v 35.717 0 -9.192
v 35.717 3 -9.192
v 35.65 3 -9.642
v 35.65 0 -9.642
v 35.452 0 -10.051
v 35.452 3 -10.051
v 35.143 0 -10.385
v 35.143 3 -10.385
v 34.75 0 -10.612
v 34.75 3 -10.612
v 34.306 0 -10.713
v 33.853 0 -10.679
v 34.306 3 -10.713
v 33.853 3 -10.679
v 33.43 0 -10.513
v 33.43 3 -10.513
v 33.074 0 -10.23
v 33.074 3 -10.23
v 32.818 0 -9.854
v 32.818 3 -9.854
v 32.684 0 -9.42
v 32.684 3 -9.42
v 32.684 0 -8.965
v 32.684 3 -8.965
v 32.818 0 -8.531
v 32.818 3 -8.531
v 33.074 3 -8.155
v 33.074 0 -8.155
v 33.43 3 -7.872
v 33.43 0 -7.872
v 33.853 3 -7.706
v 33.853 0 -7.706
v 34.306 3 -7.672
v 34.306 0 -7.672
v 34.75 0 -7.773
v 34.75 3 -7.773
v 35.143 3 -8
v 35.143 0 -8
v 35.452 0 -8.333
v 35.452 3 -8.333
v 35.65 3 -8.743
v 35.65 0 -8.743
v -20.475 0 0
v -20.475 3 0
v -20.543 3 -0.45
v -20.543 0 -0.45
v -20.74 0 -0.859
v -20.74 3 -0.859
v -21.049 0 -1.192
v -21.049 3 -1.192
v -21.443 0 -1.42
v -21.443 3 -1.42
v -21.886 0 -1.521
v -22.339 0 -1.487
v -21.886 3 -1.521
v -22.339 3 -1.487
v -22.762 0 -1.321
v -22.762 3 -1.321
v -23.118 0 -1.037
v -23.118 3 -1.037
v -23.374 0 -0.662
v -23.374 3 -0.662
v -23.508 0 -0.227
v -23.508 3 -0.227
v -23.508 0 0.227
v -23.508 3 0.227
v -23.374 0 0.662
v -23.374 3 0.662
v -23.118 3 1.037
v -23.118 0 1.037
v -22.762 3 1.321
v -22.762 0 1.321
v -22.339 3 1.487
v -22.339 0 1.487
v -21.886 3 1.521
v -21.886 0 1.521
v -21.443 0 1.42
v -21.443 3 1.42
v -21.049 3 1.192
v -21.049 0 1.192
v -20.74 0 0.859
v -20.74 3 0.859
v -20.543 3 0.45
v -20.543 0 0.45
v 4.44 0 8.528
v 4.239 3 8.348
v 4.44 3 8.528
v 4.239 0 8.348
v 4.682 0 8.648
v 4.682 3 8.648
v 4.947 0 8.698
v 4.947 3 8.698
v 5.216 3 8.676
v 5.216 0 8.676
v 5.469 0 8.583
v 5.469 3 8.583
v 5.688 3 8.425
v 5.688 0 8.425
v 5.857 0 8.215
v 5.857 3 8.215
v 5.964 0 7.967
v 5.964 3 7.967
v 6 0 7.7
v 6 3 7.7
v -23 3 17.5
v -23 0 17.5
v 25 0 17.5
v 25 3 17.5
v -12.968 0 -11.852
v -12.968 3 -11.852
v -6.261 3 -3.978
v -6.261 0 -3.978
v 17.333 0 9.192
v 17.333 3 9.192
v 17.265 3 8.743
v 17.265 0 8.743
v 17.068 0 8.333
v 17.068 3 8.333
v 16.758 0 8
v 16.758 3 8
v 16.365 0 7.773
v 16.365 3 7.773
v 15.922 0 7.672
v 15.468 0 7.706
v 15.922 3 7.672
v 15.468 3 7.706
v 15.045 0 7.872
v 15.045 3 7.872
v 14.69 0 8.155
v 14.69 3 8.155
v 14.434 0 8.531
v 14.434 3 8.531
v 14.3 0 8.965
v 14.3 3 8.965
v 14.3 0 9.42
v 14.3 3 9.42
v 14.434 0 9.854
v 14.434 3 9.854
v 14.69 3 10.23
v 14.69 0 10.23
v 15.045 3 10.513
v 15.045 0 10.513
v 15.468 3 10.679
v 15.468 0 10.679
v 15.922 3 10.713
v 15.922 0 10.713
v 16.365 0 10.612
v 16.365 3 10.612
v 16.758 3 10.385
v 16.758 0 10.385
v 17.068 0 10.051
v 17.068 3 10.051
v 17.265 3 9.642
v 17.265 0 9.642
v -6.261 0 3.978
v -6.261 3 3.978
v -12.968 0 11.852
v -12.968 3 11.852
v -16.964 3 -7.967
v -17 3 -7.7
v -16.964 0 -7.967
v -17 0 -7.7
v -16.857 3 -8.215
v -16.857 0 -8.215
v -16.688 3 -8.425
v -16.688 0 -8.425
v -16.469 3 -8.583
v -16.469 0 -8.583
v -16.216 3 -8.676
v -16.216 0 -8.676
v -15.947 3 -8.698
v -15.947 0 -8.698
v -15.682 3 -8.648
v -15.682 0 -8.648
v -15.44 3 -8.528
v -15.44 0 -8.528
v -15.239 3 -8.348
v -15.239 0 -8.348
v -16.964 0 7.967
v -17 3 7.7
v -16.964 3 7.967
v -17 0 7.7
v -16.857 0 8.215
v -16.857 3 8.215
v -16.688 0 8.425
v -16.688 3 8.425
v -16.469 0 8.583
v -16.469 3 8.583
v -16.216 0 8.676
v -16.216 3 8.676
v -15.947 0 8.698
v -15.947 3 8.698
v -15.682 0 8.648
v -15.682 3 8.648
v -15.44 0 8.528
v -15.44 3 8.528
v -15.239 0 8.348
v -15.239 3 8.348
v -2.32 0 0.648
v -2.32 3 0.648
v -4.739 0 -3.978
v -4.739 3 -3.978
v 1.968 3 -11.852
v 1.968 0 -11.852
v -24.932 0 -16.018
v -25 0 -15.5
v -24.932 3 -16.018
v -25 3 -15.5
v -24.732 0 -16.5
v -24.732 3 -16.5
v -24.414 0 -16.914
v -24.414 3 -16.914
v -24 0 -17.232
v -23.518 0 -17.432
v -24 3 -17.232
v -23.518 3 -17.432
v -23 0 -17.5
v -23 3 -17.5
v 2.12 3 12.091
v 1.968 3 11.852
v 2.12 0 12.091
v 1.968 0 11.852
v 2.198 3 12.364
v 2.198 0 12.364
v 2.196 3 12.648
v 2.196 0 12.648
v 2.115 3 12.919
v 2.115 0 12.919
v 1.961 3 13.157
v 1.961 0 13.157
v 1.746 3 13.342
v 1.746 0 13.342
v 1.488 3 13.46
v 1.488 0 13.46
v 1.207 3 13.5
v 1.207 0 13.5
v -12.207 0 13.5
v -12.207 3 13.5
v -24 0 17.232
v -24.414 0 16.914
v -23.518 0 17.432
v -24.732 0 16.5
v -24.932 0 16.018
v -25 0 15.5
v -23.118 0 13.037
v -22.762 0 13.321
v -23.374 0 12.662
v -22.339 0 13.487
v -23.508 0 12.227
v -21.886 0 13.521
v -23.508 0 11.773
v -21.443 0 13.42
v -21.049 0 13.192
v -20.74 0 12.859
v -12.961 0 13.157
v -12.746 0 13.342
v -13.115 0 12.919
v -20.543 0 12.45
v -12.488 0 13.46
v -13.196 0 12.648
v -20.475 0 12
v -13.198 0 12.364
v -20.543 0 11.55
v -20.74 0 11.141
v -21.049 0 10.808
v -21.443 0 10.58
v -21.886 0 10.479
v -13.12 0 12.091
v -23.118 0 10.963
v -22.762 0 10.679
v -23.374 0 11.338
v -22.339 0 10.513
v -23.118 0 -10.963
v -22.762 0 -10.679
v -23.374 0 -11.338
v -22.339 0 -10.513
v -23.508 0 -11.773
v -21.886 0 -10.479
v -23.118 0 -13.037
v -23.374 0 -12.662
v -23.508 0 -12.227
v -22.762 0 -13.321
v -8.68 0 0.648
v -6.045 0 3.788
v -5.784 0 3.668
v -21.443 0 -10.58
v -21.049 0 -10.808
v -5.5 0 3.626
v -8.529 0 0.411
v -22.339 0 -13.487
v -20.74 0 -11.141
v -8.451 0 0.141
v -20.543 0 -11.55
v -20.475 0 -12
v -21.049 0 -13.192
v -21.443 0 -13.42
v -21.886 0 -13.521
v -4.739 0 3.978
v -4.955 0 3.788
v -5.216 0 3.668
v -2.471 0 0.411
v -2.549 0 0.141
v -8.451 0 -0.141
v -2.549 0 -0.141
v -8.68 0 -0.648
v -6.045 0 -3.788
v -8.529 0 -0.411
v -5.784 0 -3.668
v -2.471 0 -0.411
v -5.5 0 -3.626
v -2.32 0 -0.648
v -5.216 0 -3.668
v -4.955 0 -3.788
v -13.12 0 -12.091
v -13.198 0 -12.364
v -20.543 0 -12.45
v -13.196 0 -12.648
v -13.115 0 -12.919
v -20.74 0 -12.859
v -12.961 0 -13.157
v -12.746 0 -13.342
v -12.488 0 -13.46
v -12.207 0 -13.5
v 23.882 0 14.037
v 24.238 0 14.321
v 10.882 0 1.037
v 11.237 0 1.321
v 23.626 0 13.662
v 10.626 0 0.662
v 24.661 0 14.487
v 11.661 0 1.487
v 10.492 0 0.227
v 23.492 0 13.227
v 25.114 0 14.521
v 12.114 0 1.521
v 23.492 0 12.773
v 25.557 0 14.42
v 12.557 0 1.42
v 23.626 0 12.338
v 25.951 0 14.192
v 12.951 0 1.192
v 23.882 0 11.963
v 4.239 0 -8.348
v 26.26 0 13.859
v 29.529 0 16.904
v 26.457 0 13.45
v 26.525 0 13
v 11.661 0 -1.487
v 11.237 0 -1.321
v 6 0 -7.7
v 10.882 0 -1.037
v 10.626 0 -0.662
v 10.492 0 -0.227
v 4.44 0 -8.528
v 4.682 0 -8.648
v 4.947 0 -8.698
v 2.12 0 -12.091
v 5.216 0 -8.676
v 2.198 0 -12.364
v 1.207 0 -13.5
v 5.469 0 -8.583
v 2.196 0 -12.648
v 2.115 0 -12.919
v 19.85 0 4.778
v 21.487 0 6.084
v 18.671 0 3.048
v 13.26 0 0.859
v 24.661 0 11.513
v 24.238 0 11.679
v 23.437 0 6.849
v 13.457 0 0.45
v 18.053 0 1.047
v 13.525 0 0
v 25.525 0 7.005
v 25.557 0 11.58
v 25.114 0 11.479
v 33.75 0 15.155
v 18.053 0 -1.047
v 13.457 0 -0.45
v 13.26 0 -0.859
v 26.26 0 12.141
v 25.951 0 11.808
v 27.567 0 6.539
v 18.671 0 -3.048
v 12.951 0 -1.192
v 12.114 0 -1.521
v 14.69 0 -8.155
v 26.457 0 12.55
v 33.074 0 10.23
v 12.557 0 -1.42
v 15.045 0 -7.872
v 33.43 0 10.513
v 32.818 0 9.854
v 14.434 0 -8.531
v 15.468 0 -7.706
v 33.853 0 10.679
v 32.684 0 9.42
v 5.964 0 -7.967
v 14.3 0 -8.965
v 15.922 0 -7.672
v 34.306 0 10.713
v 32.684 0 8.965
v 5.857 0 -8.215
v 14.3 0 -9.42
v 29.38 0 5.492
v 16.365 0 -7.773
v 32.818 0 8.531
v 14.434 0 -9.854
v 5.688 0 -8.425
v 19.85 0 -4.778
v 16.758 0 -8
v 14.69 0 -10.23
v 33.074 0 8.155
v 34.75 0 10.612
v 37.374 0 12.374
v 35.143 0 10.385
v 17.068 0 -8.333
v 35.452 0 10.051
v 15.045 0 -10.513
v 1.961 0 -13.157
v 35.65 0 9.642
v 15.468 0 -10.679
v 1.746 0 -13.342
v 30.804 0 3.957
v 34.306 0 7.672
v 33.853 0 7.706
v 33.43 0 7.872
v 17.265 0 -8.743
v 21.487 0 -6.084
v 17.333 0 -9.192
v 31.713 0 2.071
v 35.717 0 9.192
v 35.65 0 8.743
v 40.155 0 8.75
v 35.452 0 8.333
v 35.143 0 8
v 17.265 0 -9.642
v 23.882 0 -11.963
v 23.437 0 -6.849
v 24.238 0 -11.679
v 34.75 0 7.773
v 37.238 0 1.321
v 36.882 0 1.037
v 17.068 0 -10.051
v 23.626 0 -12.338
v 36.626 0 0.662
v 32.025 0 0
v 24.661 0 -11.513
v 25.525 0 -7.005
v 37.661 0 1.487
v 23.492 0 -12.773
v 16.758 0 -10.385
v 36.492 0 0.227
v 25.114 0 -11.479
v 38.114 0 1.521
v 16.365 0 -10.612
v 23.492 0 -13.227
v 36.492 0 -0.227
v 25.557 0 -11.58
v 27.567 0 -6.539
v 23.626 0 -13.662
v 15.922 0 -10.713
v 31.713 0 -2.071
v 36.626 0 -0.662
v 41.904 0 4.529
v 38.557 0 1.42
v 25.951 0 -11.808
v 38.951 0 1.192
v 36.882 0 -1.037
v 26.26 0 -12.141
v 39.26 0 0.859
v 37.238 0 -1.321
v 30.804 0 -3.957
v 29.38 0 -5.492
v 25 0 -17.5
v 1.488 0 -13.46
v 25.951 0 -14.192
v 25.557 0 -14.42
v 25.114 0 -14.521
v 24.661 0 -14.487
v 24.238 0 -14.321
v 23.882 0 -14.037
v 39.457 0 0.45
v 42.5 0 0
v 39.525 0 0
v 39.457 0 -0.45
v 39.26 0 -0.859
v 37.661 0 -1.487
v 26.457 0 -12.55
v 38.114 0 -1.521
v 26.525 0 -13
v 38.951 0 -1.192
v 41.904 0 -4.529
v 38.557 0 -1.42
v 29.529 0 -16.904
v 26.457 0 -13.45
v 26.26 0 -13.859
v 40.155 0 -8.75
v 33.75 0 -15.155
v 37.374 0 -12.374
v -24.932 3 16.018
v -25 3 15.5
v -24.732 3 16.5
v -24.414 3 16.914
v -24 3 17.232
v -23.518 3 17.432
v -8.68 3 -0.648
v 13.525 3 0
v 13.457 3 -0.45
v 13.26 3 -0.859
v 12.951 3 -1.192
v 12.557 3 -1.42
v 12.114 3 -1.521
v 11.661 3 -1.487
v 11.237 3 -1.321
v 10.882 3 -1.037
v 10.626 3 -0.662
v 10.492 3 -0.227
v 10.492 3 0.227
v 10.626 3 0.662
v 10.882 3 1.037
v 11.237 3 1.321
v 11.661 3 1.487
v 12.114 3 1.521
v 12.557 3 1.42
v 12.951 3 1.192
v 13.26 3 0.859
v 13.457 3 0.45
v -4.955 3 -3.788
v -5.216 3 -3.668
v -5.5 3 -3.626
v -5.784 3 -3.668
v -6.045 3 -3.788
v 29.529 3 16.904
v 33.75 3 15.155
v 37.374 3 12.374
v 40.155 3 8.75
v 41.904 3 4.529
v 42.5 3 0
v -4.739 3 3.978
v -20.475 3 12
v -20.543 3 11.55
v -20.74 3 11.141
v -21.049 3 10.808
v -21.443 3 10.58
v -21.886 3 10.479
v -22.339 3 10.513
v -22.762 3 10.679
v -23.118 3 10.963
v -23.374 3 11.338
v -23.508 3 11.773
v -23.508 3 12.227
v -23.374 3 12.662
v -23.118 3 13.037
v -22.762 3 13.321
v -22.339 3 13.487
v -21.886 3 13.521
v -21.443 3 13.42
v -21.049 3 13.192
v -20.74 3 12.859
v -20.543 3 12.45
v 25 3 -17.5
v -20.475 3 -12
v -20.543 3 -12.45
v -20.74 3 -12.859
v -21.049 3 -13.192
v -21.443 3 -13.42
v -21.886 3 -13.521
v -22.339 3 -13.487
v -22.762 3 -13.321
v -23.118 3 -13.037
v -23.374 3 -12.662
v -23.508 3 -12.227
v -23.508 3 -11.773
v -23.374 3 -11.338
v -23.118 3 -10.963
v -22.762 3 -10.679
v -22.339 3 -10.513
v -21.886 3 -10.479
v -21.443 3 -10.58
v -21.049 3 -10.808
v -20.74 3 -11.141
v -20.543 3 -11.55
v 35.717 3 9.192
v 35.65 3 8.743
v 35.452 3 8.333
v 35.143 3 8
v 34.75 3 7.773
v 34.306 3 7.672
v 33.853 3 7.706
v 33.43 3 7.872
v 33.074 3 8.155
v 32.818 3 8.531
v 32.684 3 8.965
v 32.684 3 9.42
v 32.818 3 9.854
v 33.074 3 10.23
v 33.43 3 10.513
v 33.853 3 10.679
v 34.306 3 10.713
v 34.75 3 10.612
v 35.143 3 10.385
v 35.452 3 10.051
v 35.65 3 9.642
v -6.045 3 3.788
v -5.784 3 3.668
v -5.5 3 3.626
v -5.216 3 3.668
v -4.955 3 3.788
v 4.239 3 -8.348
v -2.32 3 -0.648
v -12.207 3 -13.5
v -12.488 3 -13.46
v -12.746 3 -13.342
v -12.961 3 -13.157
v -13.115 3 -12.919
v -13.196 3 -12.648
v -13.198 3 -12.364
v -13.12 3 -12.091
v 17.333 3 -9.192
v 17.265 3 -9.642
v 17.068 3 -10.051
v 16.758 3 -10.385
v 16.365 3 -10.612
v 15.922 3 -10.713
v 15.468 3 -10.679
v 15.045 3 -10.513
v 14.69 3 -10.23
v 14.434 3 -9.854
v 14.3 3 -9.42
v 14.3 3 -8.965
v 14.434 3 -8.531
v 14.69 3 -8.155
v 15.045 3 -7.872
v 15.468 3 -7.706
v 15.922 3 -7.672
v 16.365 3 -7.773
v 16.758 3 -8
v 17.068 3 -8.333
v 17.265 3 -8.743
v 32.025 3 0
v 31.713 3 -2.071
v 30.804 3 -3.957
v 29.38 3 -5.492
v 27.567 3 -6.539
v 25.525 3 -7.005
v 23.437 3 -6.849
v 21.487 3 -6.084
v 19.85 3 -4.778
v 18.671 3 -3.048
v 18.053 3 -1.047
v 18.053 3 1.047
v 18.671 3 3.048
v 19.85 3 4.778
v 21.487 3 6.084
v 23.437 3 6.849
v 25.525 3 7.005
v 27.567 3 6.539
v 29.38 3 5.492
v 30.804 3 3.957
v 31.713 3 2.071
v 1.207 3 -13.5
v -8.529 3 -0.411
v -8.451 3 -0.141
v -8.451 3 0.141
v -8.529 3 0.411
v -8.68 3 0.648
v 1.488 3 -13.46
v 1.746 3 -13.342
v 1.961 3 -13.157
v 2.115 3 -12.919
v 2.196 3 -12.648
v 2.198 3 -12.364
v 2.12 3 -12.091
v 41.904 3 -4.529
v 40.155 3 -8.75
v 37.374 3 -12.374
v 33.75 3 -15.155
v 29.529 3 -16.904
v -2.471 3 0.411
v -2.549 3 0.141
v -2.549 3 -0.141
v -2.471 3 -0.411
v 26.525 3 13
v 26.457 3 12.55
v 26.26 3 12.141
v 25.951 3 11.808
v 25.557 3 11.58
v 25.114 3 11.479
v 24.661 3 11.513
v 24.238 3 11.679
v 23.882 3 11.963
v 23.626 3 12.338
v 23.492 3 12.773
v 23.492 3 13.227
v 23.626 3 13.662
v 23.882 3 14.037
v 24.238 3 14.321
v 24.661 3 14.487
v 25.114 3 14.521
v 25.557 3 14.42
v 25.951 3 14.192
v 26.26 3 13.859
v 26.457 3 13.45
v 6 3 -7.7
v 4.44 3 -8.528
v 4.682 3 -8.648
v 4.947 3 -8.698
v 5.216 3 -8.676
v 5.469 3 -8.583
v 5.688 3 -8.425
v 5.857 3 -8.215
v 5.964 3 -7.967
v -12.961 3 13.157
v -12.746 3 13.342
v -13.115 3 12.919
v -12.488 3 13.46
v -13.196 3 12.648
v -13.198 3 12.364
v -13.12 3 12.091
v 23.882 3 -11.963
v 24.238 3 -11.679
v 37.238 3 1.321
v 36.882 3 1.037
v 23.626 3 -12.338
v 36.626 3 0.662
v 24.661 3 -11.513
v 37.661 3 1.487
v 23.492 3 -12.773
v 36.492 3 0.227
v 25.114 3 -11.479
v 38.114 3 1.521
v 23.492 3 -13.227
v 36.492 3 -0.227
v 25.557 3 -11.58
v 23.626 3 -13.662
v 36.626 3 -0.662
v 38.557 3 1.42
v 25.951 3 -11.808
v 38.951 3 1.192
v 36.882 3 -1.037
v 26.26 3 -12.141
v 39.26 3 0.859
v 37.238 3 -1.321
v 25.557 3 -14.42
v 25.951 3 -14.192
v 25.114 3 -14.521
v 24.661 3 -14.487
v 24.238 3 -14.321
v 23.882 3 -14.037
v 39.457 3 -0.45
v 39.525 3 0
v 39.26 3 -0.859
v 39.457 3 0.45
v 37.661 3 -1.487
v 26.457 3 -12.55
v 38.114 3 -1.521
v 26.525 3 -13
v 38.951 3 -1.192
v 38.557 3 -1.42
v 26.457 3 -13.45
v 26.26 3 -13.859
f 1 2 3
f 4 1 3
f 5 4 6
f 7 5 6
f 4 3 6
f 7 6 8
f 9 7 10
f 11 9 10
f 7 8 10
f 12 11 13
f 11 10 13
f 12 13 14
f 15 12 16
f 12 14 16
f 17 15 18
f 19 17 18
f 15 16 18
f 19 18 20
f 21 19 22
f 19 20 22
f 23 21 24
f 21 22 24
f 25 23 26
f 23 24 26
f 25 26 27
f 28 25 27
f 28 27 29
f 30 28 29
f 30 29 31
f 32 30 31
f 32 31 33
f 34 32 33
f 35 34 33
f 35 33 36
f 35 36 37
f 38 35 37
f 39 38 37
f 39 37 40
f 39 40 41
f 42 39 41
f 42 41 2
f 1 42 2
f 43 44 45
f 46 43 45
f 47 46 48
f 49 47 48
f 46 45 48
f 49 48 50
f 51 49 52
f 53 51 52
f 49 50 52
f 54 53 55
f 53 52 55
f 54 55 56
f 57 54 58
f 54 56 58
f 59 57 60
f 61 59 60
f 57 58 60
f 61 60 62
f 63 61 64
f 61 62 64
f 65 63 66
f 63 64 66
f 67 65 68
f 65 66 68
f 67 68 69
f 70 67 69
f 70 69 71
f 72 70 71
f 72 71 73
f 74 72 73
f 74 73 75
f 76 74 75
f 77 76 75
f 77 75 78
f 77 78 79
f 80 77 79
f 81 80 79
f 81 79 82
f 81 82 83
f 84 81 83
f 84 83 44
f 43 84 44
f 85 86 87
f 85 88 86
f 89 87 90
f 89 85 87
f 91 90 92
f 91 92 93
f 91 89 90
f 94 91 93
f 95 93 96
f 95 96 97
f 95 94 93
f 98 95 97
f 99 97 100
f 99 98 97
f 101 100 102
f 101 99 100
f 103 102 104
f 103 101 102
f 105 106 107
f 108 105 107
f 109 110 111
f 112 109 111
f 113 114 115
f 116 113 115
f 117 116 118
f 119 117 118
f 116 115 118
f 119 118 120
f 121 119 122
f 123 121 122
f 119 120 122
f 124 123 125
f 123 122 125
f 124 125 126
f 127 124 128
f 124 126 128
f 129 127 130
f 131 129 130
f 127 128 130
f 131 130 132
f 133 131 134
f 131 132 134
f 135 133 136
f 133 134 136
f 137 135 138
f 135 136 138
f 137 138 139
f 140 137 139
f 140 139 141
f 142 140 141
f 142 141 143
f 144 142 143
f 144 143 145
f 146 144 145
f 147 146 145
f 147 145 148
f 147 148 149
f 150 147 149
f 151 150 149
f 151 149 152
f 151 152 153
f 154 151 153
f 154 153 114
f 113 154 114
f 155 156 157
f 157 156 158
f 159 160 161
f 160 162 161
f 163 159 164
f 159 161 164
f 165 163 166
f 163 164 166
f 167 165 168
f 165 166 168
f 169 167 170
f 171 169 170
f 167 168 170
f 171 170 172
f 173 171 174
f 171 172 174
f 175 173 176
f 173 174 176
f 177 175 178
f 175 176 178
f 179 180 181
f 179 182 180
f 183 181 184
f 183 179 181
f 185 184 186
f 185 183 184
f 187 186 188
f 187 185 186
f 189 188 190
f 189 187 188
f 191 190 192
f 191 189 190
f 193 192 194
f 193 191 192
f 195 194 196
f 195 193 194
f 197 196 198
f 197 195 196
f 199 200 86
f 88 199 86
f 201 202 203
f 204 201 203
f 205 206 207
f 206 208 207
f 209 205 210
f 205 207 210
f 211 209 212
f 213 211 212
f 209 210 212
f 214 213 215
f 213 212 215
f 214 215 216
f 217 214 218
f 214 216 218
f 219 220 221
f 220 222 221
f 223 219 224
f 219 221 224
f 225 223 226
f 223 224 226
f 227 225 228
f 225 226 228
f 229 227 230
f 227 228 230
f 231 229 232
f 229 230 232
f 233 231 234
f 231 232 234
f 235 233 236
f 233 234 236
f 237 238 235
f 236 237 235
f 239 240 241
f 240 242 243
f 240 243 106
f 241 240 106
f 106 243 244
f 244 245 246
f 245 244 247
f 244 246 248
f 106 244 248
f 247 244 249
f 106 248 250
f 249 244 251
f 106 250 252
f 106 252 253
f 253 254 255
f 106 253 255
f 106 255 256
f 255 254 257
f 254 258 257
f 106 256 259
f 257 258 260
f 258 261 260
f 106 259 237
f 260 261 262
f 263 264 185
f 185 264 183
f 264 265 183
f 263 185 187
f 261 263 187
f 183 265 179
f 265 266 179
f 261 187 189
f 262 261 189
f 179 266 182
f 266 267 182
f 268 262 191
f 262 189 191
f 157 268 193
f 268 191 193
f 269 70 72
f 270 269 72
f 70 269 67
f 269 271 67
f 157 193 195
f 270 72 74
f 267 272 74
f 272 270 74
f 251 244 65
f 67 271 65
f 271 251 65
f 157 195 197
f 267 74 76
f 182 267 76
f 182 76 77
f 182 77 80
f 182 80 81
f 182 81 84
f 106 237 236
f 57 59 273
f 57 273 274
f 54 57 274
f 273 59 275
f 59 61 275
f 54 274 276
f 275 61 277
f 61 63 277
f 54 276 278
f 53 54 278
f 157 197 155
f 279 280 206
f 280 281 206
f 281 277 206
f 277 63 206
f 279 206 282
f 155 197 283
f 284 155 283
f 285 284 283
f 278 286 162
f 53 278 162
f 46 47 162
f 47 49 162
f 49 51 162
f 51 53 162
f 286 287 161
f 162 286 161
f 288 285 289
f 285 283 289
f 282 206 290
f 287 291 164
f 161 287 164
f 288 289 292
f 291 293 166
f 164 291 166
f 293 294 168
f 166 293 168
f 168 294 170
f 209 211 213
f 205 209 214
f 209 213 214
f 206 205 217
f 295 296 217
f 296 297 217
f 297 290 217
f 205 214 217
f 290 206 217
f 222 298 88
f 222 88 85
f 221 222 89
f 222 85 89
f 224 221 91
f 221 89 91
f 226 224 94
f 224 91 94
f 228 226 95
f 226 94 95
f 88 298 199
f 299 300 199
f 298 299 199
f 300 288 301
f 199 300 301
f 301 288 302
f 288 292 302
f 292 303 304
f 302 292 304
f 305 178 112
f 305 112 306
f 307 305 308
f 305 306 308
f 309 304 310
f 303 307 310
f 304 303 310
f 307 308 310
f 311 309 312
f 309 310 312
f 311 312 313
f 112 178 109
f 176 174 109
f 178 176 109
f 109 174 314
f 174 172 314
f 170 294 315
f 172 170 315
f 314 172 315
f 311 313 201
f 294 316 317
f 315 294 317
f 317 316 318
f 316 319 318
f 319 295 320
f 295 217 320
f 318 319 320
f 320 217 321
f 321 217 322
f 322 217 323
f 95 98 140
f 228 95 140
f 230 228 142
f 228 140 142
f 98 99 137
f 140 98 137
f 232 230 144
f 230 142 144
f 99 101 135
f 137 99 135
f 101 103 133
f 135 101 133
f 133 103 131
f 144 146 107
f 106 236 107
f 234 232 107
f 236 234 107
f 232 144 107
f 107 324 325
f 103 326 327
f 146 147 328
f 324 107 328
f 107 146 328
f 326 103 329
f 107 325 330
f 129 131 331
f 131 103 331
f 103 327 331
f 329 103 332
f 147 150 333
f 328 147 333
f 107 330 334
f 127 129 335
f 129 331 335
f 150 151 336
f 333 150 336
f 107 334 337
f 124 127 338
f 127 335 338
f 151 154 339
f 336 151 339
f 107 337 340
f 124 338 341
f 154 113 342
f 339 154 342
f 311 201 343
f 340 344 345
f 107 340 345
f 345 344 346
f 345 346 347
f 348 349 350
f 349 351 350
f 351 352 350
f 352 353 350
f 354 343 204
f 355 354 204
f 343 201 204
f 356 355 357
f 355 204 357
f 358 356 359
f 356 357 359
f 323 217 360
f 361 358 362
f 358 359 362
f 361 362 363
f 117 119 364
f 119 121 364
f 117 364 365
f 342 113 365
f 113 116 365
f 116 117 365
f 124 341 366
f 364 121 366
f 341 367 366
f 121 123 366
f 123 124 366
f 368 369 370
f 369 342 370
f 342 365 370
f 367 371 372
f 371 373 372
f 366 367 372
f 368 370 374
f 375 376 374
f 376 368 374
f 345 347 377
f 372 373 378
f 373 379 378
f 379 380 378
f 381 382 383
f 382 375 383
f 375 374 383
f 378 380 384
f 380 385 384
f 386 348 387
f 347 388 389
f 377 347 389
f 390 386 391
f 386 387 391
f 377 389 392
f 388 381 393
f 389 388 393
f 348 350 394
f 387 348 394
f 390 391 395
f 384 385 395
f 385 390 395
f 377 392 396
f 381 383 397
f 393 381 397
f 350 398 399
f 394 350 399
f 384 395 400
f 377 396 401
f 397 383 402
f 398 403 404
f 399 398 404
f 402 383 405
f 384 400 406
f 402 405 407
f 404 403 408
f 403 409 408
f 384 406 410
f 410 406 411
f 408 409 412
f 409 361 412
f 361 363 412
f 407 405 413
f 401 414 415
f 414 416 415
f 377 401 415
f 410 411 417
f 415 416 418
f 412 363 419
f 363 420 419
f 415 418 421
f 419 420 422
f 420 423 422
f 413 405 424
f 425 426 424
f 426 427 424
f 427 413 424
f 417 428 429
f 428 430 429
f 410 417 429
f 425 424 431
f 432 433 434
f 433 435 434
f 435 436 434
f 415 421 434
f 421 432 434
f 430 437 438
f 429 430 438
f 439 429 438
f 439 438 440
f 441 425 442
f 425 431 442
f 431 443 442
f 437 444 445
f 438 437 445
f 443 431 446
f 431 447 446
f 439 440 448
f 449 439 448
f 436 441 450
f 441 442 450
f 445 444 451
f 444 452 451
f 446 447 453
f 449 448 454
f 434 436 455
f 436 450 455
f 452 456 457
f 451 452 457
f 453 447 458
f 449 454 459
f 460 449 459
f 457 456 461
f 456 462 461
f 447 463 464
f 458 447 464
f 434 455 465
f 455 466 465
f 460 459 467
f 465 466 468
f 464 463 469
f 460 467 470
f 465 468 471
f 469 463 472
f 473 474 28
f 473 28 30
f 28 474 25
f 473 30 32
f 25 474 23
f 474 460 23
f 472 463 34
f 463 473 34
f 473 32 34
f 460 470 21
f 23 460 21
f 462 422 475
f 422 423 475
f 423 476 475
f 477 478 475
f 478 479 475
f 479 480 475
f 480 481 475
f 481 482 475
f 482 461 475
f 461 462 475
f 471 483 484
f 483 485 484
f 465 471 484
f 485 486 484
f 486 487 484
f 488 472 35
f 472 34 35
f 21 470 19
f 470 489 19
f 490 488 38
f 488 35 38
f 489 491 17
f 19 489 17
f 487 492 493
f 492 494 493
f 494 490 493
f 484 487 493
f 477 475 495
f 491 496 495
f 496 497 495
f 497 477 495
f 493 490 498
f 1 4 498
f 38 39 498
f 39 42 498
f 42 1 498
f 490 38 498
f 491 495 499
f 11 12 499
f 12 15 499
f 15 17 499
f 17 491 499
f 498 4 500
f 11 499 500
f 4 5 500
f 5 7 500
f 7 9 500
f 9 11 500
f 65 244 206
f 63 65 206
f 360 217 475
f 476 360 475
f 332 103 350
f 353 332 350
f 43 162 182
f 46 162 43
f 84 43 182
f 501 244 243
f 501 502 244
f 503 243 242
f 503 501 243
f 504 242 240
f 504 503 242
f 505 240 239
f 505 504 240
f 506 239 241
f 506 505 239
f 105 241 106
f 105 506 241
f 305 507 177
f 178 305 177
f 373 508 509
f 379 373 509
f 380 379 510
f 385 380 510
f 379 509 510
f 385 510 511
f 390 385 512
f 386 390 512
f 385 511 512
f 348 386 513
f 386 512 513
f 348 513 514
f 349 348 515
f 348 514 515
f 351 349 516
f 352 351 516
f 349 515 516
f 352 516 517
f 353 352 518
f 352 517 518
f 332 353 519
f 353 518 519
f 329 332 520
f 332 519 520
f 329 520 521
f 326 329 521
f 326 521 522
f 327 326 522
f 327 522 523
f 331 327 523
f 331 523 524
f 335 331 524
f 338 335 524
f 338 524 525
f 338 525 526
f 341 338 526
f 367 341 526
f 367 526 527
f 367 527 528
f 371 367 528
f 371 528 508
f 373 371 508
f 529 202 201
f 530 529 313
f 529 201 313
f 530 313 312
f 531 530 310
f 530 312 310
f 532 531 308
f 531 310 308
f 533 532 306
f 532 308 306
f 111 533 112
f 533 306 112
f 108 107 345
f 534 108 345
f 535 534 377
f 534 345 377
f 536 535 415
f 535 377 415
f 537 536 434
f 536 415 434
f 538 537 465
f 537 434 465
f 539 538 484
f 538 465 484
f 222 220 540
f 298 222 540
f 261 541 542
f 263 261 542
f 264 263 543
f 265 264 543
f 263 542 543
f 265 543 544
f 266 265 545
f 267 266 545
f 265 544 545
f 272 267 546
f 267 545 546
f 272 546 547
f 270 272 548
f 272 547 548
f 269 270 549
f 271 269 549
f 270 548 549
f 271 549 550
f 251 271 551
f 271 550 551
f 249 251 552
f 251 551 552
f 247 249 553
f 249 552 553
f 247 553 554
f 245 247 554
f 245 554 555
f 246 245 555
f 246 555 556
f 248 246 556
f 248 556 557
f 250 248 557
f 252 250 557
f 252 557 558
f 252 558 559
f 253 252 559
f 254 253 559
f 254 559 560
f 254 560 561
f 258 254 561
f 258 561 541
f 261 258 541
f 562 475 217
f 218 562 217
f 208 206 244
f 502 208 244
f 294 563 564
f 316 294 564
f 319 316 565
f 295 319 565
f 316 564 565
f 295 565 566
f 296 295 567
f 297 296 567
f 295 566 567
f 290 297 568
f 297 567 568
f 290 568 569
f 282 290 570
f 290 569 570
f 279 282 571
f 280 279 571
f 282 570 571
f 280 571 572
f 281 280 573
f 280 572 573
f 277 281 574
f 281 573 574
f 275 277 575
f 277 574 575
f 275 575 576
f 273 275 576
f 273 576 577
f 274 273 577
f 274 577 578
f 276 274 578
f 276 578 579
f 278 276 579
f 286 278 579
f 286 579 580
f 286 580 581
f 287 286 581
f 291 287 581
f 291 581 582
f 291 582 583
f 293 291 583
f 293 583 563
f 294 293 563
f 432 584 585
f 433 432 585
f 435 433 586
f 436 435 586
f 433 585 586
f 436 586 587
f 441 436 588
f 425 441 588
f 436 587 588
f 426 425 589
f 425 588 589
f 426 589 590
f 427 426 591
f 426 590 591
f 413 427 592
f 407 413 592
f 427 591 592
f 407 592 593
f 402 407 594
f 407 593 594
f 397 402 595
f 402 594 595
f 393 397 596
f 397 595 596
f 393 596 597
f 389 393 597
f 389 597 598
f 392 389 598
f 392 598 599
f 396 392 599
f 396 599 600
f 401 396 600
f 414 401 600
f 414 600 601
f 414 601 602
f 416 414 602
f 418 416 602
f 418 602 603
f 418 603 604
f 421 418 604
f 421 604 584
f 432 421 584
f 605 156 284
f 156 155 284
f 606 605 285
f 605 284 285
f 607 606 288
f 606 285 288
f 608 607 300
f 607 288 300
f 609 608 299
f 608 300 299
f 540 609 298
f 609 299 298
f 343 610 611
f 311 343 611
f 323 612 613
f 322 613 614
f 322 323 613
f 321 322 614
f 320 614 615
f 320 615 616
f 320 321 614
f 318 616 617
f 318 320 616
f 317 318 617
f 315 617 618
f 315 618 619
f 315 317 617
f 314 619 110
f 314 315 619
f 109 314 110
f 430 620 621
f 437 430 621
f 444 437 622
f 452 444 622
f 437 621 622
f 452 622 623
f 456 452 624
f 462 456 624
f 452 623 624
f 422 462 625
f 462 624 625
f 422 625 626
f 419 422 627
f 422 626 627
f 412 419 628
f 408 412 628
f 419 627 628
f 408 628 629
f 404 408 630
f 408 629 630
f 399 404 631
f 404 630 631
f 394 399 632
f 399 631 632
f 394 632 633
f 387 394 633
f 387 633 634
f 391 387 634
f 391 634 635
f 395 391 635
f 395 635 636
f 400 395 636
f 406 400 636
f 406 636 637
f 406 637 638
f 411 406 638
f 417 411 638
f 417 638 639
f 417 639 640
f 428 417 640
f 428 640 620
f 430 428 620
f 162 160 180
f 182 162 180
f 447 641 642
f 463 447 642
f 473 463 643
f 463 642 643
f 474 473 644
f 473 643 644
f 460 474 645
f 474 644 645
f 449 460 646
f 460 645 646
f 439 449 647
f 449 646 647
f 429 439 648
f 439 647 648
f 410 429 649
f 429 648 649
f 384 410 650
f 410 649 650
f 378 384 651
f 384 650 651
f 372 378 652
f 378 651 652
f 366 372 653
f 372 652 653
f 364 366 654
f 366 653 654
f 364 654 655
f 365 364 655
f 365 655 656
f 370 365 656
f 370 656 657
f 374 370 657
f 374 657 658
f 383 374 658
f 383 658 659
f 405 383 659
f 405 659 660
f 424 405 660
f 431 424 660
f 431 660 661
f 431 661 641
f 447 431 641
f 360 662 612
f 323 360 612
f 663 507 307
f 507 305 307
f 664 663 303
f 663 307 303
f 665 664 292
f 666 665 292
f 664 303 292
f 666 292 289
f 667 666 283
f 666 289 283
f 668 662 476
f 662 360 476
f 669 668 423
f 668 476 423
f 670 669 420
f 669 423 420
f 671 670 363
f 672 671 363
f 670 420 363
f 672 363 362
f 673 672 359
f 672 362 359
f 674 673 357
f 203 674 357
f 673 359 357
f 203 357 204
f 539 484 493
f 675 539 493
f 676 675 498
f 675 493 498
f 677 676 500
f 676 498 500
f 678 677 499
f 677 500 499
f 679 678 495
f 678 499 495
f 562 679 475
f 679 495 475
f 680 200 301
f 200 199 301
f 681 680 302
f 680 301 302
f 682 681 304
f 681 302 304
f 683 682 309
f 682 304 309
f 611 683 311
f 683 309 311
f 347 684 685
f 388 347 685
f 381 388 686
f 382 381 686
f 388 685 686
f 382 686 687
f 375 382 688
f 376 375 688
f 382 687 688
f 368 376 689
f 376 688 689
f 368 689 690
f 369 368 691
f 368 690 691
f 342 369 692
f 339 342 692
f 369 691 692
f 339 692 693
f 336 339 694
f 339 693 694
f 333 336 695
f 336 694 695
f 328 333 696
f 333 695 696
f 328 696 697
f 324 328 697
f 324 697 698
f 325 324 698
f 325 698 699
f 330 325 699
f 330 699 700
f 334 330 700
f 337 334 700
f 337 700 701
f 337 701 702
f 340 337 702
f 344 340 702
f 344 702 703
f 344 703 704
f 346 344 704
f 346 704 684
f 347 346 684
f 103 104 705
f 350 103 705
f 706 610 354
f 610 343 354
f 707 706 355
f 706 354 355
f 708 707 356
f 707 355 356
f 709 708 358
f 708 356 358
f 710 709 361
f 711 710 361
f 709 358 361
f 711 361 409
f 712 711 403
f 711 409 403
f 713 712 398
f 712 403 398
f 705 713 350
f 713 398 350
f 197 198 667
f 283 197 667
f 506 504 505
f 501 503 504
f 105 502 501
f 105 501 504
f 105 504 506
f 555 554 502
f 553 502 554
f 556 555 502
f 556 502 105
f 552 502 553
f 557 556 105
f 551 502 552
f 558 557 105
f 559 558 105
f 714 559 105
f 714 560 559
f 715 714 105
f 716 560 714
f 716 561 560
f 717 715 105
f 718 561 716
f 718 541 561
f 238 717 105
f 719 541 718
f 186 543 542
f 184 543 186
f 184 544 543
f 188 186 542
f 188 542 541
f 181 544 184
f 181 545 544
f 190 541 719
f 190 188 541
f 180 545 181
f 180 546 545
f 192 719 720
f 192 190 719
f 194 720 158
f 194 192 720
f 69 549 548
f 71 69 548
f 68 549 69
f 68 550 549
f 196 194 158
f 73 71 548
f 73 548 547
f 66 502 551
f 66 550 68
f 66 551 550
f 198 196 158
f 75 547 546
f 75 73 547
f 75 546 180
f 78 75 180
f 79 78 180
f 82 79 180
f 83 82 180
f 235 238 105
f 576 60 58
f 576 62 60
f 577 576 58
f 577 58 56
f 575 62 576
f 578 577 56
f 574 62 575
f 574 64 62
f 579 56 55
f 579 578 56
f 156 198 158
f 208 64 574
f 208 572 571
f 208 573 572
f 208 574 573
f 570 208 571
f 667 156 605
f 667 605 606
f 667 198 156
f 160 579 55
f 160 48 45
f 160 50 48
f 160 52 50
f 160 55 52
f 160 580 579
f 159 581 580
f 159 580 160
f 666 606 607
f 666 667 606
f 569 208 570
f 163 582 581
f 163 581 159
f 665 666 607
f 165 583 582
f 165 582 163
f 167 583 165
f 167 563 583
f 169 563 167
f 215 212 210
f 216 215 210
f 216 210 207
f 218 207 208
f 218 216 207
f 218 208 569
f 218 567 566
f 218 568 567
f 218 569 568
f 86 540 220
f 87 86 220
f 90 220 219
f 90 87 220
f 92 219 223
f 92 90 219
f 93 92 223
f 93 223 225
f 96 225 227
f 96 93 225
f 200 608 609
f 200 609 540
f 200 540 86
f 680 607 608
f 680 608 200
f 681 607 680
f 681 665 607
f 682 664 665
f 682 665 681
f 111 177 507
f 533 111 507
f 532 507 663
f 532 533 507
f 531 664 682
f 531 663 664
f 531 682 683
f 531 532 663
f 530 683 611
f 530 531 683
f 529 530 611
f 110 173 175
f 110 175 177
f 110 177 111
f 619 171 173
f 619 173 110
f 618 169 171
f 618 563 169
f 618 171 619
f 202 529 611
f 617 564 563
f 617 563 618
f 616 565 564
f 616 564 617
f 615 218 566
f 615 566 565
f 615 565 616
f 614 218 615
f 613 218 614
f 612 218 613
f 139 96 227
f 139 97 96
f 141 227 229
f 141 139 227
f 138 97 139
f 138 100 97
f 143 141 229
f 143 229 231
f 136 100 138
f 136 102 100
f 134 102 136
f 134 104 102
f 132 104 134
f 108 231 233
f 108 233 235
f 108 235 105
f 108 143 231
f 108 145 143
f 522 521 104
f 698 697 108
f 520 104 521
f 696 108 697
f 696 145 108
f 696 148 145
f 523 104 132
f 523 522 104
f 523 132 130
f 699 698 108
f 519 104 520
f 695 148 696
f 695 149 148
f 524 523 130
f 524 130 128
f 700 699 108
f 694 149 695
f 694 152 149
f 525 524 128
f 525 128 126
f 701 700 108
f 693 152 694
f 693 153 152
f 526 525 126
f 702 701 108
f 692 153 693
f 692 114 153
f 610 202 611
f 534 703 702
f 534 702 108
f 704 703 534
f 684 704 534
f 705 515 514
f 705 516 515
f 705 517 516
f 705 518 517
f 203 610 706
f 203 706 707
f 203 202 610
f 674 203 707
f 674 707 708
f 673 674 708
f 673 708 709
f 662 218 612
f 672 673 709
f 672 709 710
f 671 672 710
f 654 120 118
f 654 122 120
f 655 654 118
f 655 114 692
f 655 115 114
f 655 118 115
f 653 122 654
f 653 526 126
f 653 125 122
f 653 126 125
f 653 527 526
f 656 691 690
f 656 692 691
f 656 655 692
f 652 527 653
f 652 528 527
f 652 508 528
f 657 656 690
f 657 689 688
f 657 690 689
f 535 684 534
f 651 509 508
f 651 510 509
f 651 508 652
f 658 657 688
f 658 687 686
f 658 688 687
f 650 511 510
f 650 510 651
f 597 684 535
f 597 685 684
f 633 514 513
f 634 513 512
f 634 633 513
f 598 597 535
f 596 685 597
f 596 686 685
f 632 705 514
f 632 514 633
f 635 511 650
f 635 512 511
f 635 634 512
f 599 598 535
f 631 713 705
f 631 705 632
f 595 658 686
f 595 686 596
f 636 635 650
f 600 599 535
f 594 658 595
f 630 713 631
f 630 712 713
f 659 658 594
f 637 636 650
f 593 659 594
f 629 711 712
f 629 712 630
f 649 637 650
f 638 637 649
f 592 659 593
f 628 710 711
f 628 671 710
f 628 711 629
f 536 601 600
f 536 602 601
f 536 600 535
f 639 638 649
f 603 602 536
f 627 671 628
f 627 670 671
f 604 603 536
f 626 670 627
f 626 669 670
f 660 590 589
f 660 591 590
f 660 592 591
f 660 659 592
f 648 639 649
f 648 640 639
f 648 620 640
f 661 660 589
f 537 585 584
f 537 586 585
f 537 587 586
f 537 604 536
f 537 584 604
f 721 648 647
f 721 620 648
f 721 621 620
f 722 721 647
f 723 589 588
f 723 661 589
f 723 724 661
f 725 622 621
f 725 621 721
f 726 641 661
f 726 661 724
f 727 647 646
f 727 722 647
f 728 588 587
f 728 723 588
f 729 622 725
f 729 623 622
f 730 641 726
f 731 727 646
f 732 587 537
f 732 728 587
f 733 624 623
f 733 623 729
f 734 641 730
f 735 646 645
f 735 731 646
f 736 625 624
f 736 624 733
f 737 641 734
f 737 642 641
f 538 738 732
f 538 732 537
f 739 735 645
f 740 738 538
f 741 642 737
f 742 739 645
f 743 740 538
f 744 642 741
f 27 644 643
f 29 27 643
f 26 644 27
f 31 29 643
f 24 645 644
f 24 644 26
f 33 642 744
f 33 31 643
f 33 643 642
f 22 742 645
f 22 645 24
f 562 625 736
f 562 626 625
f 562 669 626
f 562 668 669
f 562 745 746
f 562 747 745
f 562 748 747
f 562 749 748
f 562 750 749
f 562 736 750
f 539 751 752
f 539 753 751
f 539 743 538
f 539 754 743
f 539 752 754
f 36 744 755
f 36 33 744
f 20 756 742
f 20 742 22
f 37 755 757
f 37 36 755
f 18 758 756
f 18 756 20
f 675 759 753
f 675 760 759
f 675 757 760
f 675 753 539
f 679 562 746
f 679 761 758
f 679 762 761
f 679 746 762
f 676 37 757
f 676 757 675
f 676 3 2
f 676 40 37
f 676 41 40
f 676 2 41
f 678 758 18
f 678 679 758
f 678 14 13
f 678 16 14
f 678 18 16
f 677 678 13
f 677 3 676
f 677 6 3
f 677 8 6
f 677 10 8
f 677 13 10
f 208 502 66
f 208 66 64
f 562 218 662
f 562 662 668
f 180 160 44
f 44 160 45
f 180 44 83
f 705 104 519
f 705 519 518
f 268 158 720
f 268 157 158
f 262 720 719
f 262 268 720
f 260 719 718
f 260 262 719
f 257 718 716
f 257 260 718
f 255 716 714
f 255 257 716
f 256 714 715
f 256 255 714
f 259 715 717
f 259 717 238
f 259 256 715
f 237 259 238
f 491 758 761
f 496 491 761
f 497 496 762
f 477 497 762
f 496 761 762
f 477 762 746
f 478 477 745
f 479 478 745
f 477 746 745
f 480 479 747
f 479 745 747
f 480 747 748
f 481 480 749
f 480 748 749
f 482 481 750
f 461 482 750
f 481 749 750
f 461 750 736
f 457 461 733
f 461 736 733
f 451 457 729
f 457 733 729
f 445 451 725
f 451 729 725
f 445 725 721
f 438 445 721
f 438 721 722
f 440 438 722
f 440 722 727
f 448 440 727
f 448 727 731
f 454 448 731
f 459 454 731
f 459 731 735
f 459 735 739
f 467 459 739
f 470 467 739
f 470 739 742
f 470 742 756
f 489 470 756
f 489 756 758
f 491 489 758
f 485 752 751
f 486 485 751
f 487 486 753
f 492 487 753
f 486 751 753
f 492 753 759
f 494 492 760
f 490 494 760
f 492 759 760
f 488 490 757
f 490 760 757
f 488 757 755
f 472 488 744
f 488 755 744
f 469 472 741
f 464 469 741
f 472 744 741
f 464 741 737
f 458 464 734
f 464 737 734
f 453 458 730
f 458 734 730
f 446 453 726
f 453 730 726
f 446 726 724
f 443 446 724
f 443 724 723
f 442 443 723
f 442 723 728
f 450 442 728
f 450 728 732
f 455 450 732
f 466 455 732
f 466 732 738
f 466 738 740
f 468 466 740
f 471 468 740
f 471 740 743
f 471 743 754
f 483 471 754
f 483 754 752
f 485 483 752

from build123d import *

# Parameters (mm, degrees)
EXTRUDE_1_DEPTH     = 3
SKETCH_2_R          = 7.025
CUT_EXTRUDE_1_DEPTH = 4
SKETCH_4_R          = 1.525
CUT_EXTRUDE_3_DEPTH = 4
FILLET_2_R          = 2
CUT_EXTRUDE_6_DEPTH = 4
SKETCH_10_R         = 1.525
CUT_EXTRUDE_8_DEPTH = 4
FILLET_7_R          = 1


with BuildPart() as part:
    # 草图1 → 凸台-拉伸1 (new body)
    with BuildSketch(Plane(origin=(0, 0, 0), x_dir=(1, 0, 0), z_dir=(0, 1, 0))):
        with BuildLine():
            Line((-25, 17.5), (-25, -17.5))
            Line((-25, -17.5), (25, -17.5))
            ThreePointArc((25, -17.5), (7.5, 0), (25, 17.5))
            Line((25, 17.5), (-25, 17.5))
        make_face()
        with BuildLine():
            ThreePointArc((25, 17.5), (7.5, 0), (25, -17.5))
            Line((25, -17.5), (25, 17.5))
        make_face()
        with BuildLine():
            Line((25, 17.5), (25, -17.5))
            ThreePointArc((25, -17.5), (37.374368671, -12.374368671), (42.5, 0))
            ThreePointArc((42.5, 0), (37.374368671, 12.374368671), (25, 17.5))
        make_face()
    extrude(amount=EXTRUDE_1_DEPTH)

    # 草图2 → 切除-拉伸1 (cut, through all)
    with BuildSketch(Plane(origin=(0, 3, 0), x_dir=(1, 0, 0), z_dir=(0, 1, 0))):
        with Locations((25, 0)):
            Circle(SKETCH_2_R)
    extrude(amount=-CUT_EXTRUDE_1_DEPTH, mode=Mode.SUBTRACT)

    # 草图4 → 切除-拉伸3 (cut, through all)
    with BuildSketch(Plane(origin=(0, 3, 0), x_dir=(1, 0, 0), z_dir=(0, 1, 0))):
        with Locations((25, 13)):
            Circle(SKETCH_4_R)
        with Locations((34.192388155, 9.192388155)):
            Circle(SKETCH_4_R)
        with Locations((38, 0)):
            Circle(SKETCH_4_R)
        with Locations((34.192388155, -9.192388155)):
            Circle(SKETCH_4_R)
        with Locations((25, -13)):
            Circle(SKETCH_4_R)
        with Locations((15.807611845, -9.192388155)):
            Circle(SKETCH_4_R)
        with Locations((12, 0)):
            Circle(SKETCH_4_R)
        with Locations((15.807611845, 9.192388155)):
            Circle(SKETCH_4_R)
    extrude(amount=-CUT_EXTRUDE_3_DEPTH, mode=Mode.SUBTRACT)

    # 圆角2
    fillet_2_edges = [part.edges().sort_by_distance(p)[0] for p in [
        (-25, 1.5, 17.5),
        (-25, 1.5, -17.5),
    ]]
    fillet(fillet_2_edges, radius=FILLET_2_R)

    # 草图7 → 切除-拉伸6 (cut, through all)
    with BuildSketch(Plane(origin=(0, 3, 0), x_dir=(1, 0, 0), z_dir=(0, 1, 0))):
        Polygon((3.372718837, 13.5), (-14.372718837, 13.5), (-5.5, 3.084199626), align=None)
        Polygon((-2.872718837, 0), (6, -10.415800374), (6, 10.415800374), align=None)
        Polygon((-5.5, -3.084199626), (-14.372718837, -13.5), (3.372718837, -13.5), align=None)
        Polygon((-17, 10.415800374), (-17, -10.415800374), (-8.127281163, 0), align=None)
    extrude(amount=-CUT_EXTRUDE_6_DEPTH, mode=Mode.SUBTRACT)

    # 草图10 → 切除-拉伸8 (cut, through all)
    with BuildSketch(Plane(origin=(0, 3, 0), x_dir=(1, 0, 0), z_dir=(0, 1, 0))):
        with Locations((-22, 0)):
            Circle(SKETCH_10_R)
        with Locations((-22, 12)):
            Circle(SKETCH_10_R)
        with Locations((-22, -12)):
            Circle(SKETCH_10_R)
    extrude(amount=-CUT_EXTRUDE_8_DEPTH, mode=Mode.SUBTRACT)

    # 圆角7
    fillet_7_edges = [part.edges().sort_by_distance(p)[0] for p in [
        (-17, 1.5, 10.415800374),
        (-17, 1.5, -10.415800374),
        (-8.127281163, 1.5, 0),
        (-5.5, 1.5, -3.084199626),
        (-14.372718837, 1.5, -13.5),
        (3.372718837, 1.5, -13.5),
        (-14.372718837, 1.5, 13.5),
        (-5.5, 1.5, 3.084199626),
        (3.372718837, 1.5, 13.5),
        (-2.872718837, 1.5, 0),
        (6, 1.5, -10.415800374),
        (6, 1.5, 10.415800374),
    ]]
    fillet(fillet_7_edges, radius=FILLET_7_R)


solid = part.part
